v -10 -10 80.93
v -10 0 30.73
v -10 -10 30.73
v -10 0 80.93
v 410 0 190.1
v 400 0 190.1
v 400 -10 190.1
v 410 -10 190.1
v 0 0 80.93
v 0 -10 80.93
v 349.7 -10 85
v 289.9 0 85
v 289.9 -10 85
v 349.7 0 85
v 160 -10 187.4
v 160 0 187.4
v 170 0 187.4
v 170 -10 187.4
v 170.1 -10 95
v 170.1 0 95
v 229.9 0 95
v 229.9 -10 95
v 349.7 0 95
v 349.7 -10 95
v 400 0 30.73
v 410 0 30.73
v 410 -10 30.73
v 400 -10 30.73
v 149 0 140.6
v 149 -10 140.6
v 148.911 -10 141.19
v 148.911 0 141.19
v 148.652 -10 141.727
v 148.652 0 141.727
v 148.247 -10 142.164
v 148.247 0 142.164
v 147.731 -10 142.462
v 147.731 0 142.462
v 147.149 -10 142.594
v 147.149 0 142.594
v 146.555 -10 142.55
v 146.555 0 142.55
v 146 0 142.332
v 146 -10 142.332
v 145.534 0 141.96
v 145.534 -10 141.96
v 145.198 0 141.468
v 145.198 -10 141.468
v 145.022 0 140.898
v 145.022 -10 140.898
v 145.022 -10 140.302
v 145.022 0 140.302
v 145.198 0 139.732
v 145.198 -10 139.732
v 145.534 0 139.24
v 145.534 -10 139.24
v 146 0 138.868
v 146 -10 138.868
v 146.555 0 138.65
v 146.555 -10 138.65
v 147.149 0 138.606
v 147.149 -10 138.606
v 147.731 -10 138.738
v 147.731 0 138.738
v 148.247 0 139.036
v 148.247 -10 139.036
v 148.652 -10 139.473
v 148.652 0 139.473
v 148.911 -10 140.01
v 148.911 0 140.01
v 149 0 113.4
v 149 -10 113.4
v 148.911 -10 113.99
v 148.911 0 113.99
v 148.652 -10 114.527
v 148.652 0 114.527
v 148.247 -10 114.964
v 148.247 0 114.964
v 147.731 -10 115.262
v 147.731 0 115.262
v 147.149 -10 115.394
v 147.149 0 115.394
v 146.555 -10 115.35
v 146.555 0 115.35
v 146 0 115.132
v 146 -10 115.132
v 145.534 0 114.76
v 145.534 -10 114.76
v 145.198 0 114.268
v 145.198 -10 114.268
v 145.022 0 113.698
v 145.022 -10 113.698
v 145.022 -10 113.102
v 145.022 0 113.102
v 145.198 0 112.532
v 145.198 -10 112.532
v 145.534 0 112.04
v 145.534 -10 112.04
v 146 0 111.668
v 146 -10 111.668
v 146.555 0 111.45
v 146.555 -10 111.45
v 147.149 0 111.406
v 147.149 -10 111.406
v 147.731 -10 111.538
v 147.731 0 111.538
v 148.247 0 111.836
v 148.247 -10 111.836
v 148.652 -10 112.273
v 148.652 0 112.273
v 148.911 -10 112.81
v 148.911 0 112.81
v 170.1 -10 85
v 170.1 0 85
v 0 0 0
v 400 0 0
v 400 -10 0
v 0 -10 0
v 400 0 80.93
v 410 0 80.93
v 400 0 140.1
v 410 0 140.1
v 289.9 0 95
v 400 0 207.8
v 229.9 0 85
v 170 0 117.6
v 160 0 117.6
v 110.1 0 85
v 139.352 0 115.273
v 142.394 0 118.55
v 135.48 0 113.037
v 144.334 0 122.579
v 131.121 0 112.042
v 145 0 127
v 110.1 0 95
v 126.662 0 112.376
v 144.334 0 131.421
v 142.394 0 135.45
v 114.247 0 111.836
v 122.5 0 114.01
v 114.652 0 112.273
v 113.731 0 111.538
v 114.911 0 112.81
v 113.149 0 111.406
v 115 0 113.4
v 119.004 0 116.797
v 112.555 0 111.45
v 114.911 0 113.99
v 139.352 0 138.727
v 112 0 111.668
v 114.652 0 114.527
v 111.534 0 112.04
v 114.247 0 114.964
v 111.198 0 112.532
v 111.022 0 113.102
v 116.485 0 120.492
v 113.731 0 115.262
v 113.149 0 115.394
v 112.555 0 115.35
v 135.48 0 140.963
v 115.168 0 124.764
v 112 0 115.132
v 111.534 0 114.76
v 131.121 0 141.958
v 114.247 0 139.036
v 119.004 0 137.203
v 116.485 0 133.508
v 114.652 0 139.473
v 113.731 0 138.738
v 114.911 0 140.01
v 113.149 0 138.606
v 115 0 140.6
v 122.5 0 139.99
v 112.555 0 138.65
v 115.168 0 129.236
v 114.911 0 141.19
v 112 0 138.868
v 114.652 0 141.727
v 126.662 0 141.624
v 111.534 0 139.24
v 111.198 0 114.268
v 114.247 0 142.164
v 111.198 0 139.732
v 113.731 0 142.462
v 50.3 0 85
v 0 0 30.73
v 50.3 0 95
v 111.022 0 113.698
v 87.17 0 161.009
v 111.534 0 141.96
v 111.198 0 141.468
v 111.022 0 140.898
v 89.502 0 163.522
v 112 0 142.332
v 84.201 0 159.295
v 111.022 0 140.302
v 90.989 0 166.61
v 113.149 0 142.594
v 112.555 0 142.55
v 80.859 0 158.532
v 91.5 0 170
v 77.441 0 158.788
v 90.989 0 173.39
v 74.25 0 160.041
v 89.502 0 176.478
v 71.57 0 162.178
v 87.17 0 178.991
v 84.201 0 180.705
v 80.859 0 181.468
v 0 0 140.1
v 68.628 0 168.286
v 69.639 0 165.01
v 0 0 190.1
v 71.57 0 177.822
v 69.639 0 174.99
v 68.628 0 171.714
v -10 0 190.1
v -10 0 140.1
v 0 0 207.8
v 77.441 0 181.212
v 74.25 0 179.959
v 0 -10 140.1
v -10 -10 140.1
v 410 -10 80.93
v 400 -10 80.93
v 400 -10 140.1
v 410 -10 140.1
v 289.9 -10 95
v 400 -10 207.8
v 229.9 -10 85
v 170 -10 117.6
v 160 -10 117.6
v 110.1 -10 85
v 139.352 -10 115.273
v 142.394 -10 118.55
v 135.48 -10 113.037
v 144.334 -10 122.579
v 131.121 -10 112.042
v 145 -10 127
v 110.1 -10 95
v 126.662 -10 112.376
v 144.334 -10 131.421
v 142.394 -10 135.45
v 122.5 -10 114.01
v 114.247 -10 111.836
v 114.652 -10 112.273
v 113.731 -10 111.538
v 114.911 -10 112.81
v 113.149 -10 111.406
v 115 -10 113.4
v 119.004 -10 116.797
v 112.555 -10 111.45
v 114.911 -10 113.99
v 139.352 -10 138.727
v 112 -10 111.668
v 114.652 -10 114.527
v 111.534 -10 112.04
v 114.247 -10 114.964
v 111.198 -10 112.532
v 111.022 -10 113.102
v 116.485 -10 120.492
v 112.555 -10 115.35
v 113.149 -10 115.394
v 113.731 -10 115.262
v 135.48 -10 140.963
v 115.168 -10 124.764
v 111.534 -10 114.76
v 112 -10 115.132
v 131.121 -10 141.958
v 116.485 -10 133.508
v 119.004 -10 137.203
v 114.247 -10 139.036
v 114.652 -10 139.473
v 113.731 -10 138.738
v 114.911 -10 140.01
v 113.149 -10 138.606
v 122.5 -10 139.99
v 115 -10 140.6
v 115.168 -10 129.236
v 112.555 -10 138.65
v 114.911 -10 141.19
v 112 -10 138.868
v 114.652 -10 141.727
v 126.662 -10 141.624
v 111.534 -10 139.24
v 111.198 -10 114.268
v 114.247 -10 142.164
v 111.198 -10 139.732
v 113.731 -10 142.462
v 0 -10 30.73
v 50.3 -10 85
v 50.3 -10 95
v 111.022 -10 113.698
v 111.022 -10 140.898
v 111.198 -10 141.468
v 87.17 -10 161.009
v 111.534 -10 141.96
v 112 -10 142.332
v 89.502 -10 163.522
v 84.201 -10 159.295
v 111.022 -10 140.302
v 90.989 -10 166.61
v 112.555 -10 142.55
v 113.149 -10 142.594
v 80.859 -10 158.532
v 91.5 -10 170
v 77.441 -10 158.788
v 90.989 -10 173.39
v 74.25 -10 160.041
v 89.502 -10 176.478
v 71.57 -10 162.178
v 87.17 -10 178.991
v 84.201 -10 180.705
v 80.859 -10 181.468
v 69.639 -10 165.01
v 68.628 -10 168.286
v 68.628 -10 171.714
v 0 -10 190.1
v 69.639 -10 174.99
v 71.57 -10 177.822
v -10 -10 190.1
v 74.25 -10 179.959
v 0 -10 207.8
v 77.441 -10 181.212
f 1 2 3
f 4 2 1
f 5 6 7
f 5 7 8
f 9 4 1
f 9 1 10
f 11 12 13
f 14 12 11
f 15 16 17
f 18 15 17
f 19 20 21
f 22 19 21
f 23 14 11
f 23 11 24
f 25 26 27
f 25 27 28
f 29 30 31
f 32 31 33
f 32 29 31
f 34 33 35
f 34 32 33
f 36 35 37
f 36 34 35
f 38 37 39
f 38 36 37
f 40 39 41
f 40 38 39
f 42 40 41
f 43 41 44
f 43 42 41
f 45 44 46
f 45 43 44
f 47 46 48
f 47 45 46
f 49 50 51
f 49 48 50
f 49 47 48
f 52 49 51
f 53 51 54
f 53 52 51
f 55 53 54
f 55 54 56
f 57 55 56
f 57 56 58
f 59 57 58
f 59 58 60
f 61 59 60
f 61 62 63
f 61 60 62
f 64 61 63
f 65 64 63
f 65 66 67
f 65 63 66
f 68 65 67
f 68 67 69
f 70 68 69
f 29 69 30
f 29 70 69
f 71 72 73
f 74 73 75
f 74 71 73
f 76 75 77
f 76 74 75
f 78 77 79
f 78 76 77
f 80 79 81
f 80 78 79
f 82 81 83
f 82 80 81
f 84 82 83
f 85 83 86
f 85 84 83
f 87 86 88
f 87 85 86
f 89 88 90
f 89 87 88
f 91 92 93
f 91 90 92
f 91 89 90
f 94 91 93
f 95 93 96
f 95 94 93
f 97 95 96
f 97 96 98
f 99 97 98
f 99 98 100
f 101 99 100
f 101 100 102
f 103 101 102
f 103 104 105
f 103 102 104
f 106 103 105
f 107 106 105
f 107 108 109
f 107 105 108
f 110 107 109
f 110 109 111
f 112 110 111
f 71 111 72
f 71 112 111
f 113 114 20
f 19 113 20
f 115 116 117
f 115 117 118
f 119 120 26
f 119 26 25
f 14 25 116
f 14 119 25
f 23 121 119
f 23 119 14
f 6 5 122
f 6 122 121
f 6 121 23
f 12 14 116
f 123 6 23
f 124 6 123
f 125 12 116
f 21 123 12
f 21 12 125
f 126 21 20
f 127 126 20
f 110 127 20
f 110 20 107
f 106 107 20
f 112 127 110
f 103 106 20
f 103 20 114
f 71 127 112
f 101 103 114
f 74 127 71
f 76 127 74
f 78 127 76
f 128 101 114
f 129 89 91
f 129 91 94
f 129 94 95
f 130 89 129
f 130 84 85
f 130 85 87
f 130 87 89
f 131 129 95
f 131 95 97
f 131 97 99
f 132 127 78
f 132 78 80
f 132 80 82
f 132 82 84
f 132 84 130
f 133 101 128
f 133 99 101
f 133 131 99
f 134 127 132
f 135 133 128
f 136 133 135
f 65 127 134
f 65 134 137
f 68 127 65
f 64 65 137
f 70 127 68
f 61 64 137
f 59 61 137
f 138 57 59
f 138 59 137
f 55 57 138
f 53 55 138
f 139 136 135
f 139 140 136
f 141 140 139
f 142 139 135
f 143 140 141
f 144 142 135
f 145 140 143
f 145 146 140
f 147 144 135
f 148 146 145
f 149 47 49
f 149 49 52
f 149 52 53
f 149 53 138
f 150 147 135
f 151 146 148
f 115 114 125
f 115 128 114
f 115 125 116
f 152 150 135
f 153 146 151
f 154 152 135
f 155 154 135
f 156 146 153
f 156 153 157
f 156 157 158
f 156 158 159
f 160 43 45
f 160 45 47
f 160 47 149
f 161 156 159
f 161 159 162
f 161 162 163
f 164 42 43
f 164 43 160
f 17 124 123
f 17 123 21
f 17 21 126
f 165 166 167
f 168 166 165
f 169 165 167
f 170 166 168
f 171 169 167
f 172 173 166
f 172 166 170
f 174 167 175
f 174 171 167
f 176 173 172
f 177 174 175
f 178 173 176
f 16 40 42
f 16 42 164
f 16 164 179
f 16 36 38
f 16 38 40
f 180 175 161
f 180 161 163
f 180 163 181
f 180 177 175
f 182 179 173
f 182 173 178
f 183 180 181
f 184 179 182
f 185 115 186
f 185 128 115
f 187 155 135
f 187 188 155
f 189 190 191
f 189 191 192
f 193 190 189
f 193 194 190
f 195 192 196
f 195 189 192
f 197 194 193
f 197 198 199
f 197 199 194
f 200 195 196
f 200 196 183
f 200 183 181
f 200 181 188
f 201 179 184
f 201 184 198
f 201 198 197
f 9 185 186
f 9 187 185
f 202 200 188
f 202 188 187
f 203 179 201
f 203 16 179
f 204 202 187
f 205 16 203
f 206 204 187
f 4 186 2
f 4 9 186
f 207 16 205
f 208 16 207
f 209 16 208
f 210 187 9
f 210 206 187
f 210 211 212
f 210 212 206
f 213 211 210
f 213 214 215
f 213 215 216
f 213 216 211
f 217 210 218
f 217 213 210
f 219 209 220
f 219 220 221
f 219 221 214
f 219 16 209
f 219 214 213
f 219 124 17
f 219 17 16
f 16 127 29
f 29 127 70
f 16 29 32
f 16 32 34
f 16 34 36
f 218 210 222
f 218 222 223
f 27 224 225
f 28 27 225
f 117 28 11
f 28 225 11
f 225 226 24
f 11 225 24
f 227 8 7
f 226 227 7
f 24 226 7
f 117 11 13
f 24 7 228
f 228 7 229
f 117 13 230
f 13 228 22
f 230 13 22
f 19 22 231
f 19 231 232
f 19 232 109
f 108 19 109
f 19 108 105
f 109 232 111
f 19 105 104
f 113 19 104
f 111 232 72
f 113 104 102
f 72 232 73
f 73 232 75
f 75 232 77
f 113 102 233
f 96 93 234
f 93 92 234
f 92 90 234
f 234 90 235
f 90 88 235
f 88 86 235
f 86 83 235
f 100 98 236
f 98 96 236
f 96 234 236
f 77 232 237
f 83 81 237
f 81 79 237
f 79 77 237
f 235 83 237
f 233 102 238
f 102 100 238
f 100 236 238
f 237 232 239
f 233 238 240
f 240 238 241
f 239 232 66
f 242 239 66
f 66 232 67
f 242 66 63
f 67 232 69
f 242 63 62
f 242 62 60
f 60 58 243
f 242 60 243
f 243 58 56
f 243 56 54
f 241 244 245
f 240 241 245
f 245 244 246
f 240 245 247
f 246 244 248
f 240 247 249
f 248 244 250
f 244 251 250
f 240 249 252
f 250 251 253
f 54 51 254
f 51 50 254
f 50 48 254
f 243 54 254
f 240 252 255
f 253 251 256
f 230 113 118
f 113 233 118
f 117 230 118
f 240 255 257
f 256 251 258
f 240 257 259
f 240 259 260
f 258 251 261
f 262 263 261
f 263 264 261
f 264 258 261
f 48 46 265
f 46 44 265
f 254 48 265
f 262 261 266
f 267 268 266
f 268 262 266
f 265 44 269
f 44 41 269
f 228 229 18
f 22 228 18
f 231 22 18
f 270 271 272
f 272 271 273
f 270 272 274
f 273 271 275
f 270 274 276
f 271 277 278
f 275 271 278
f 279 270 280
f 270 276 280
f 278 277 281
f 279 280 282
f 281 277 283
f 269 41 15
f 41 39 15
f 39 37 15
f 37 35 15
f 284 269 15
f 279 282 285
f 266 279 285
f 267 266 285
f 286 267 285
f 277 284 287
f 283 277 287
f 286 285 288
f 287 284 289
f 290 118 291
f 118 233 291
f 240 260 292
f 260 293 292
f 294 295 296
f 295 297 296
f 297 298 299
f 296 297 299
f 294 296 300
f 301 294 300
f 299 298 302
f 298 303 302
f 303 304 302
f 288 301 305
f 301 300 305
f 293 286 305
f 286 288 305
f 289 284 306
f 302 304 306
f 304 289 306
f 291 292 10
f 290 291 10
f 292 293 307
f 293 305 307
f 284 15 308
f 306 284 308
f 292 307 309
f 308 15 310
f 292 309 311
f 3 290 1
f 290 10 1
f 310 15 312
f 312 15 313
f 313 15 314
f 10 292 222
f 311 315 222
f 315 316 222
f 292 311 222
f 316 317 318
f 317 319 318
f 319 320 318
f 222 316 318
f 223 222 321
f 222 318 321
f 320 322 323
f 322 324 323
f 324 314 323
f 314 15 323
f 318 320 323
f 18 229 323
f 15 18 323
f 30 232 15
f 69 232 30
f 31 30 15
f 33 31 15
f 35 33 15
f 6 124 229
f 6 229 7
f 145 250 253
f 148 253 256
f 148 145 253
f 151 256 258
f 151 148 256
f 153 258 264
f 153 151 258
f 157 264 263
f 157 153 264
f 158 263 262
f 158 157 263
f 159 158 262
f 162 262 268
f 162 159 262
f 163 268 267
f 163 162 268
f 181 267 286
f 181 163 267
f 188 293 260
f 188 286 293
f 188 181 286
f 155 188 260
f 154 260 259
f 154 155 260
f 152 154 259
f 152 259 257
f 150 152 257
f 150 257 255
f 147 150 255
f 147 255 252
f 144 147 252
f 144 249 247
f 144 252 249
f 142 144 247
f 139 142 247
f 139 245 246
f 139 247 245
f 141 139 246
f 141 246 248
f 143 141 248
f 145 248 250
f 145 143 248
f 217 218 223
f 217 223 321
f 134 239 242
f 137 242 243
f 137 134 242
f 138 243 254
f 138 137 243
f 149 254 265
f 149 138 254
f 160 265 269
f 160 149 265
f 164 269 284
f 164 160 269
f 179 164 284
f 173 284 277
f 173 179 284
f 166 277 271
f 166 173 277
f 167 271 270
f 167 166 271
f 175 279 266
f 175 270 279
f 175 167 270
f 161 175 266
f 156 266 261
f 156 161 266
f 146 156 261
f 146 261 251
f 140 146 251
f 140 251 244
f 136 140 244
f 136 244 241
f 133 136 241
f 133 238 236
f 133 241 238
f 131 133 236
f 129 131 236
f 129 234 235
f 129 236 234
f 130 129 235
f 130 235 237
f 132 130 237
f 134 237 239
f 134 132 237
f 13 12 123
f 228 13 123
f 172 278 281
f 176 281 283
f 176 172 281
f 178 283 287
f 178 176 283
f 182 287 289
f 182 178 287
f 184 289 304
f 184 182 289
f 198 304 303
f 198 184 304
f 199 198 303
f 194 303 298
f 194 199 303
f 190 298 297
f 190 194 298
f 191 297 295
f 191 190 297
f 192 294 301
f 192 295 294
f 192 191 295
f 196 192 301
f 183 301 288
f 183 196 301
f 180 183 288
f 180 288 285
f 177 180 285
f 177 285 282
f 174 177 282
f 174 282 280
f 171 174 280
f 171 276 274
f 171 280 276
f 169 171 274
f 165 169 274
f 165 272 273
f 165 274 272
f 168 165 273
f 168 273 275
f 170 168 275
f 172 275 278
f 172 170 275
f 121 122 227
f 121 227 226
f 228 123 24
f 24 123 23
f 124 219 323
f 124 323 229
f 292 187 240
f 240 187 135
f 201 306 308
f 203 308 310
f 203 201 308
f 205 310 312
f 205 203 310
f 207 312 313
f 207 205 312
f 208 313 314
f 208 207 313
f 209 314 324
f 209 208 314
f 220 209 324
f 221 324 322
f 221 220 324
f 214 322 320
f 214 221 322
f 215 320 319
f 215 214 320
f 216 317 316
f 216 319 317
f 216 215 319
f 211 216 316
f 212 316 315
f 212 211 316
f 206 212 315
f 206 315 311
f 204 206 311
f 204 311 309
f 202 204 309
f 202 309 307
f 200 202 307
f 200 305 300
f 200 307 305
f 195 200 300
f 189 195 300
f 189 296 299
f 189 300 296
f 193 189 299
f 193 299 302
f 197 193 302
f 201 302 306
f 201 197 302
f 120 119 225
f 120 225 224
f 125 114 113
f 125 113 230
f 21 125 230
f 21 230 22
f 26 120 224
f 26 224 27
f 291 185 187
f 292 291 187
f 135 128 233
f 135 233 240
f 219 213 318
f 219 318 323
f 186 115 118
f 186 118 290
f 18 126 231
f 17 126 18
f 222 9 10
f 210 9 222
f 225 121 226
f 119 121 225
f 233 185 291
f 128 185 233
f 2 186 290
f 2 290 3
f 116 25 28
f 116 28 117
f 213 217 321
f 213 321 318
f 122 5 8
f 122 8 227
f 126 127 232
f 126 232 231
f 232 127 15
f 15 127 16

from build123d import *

# Parameters (mm, degrees)
SKETCH_W        = 59.8
SKETCH_H        = 10
SKETCH_W_2      = 10
SKETCH_H_2      = 69.8
PAD_DEPTH       = 10
SKETCH001_R     = 2
SKETCH001_R_2   = 15
POCKET_DEPTH    = 10.001
SKETCH002_R     = 11.5
POCKET001_DEPTH = 10.001


with BuildPart() as part:
    # Sketch → Pad (new body)
    with BuildSketch(Plane.XZ):
        Polygon((0, 0), (0, 30.73), (-10, 30.73), (-10, 80.93), (0, 80.93), (0, 140.1), (-10, 140.1), (-10, 190.1), (0, 190.1), (0, 207.8), (400, 207.8), (400, 190.1), (410, 190.1), (410, 140.1), (400, 140.1), (400, 80.93), (410, 80.93), (410, 30.73), (400, 30.73), (400, 0), align=None)
        with Locations((80.2, 90)):
            Rectangle(SKETCH_W, SKETCH_H, mode=Mode.SUBTRACT)
        with Locations((200, 90)):
            Rectangle(SKETCH_W, SKETCH_H, mode=Mode.SUBTRACT)
        with Locations((319.8, 90)):
            Rectangle(SKETCH_W, SKETCH_H, mode=Mode.SUBTRACT)
        with Locations((165, 152.5)):
            Rectangle(SKETCH_W_2, SKETCH_H_2, mode=Mode.SUBTRACT)
    extrude(amount=PAD_DEPTH)

    # Sketch001 → Pocket (cut, through all)
    with BuildSketch(Plane.XZ):
        with Locations((113, 140.6)):
            Circle(SKETCH001_R)
        with Locations((147, 140.6)):
            Circle(SKETCH001_R)
        with Locations((147, 113.4)):
            Circle(SKETCH001_R)
        with Locations((113, 113.4)):
            Circle(SKETCH001_R)
        with Locations((130, 127)):
            Circle(SKETCH001_R_2)
    extrude(amount=POCKET_DEPTH, mode=Mode.SUBTRACT)

    # Sketch002 → Pocket001 (cut, through all)
    with BuildSketch(Plane.XZ):
        with Locations((80, 170)):
            Circle(SKETCH002_R)
    extrude(amount=POCKET001_DEPTH, mode=Mode.SUBTRACT)


solid = part.part
